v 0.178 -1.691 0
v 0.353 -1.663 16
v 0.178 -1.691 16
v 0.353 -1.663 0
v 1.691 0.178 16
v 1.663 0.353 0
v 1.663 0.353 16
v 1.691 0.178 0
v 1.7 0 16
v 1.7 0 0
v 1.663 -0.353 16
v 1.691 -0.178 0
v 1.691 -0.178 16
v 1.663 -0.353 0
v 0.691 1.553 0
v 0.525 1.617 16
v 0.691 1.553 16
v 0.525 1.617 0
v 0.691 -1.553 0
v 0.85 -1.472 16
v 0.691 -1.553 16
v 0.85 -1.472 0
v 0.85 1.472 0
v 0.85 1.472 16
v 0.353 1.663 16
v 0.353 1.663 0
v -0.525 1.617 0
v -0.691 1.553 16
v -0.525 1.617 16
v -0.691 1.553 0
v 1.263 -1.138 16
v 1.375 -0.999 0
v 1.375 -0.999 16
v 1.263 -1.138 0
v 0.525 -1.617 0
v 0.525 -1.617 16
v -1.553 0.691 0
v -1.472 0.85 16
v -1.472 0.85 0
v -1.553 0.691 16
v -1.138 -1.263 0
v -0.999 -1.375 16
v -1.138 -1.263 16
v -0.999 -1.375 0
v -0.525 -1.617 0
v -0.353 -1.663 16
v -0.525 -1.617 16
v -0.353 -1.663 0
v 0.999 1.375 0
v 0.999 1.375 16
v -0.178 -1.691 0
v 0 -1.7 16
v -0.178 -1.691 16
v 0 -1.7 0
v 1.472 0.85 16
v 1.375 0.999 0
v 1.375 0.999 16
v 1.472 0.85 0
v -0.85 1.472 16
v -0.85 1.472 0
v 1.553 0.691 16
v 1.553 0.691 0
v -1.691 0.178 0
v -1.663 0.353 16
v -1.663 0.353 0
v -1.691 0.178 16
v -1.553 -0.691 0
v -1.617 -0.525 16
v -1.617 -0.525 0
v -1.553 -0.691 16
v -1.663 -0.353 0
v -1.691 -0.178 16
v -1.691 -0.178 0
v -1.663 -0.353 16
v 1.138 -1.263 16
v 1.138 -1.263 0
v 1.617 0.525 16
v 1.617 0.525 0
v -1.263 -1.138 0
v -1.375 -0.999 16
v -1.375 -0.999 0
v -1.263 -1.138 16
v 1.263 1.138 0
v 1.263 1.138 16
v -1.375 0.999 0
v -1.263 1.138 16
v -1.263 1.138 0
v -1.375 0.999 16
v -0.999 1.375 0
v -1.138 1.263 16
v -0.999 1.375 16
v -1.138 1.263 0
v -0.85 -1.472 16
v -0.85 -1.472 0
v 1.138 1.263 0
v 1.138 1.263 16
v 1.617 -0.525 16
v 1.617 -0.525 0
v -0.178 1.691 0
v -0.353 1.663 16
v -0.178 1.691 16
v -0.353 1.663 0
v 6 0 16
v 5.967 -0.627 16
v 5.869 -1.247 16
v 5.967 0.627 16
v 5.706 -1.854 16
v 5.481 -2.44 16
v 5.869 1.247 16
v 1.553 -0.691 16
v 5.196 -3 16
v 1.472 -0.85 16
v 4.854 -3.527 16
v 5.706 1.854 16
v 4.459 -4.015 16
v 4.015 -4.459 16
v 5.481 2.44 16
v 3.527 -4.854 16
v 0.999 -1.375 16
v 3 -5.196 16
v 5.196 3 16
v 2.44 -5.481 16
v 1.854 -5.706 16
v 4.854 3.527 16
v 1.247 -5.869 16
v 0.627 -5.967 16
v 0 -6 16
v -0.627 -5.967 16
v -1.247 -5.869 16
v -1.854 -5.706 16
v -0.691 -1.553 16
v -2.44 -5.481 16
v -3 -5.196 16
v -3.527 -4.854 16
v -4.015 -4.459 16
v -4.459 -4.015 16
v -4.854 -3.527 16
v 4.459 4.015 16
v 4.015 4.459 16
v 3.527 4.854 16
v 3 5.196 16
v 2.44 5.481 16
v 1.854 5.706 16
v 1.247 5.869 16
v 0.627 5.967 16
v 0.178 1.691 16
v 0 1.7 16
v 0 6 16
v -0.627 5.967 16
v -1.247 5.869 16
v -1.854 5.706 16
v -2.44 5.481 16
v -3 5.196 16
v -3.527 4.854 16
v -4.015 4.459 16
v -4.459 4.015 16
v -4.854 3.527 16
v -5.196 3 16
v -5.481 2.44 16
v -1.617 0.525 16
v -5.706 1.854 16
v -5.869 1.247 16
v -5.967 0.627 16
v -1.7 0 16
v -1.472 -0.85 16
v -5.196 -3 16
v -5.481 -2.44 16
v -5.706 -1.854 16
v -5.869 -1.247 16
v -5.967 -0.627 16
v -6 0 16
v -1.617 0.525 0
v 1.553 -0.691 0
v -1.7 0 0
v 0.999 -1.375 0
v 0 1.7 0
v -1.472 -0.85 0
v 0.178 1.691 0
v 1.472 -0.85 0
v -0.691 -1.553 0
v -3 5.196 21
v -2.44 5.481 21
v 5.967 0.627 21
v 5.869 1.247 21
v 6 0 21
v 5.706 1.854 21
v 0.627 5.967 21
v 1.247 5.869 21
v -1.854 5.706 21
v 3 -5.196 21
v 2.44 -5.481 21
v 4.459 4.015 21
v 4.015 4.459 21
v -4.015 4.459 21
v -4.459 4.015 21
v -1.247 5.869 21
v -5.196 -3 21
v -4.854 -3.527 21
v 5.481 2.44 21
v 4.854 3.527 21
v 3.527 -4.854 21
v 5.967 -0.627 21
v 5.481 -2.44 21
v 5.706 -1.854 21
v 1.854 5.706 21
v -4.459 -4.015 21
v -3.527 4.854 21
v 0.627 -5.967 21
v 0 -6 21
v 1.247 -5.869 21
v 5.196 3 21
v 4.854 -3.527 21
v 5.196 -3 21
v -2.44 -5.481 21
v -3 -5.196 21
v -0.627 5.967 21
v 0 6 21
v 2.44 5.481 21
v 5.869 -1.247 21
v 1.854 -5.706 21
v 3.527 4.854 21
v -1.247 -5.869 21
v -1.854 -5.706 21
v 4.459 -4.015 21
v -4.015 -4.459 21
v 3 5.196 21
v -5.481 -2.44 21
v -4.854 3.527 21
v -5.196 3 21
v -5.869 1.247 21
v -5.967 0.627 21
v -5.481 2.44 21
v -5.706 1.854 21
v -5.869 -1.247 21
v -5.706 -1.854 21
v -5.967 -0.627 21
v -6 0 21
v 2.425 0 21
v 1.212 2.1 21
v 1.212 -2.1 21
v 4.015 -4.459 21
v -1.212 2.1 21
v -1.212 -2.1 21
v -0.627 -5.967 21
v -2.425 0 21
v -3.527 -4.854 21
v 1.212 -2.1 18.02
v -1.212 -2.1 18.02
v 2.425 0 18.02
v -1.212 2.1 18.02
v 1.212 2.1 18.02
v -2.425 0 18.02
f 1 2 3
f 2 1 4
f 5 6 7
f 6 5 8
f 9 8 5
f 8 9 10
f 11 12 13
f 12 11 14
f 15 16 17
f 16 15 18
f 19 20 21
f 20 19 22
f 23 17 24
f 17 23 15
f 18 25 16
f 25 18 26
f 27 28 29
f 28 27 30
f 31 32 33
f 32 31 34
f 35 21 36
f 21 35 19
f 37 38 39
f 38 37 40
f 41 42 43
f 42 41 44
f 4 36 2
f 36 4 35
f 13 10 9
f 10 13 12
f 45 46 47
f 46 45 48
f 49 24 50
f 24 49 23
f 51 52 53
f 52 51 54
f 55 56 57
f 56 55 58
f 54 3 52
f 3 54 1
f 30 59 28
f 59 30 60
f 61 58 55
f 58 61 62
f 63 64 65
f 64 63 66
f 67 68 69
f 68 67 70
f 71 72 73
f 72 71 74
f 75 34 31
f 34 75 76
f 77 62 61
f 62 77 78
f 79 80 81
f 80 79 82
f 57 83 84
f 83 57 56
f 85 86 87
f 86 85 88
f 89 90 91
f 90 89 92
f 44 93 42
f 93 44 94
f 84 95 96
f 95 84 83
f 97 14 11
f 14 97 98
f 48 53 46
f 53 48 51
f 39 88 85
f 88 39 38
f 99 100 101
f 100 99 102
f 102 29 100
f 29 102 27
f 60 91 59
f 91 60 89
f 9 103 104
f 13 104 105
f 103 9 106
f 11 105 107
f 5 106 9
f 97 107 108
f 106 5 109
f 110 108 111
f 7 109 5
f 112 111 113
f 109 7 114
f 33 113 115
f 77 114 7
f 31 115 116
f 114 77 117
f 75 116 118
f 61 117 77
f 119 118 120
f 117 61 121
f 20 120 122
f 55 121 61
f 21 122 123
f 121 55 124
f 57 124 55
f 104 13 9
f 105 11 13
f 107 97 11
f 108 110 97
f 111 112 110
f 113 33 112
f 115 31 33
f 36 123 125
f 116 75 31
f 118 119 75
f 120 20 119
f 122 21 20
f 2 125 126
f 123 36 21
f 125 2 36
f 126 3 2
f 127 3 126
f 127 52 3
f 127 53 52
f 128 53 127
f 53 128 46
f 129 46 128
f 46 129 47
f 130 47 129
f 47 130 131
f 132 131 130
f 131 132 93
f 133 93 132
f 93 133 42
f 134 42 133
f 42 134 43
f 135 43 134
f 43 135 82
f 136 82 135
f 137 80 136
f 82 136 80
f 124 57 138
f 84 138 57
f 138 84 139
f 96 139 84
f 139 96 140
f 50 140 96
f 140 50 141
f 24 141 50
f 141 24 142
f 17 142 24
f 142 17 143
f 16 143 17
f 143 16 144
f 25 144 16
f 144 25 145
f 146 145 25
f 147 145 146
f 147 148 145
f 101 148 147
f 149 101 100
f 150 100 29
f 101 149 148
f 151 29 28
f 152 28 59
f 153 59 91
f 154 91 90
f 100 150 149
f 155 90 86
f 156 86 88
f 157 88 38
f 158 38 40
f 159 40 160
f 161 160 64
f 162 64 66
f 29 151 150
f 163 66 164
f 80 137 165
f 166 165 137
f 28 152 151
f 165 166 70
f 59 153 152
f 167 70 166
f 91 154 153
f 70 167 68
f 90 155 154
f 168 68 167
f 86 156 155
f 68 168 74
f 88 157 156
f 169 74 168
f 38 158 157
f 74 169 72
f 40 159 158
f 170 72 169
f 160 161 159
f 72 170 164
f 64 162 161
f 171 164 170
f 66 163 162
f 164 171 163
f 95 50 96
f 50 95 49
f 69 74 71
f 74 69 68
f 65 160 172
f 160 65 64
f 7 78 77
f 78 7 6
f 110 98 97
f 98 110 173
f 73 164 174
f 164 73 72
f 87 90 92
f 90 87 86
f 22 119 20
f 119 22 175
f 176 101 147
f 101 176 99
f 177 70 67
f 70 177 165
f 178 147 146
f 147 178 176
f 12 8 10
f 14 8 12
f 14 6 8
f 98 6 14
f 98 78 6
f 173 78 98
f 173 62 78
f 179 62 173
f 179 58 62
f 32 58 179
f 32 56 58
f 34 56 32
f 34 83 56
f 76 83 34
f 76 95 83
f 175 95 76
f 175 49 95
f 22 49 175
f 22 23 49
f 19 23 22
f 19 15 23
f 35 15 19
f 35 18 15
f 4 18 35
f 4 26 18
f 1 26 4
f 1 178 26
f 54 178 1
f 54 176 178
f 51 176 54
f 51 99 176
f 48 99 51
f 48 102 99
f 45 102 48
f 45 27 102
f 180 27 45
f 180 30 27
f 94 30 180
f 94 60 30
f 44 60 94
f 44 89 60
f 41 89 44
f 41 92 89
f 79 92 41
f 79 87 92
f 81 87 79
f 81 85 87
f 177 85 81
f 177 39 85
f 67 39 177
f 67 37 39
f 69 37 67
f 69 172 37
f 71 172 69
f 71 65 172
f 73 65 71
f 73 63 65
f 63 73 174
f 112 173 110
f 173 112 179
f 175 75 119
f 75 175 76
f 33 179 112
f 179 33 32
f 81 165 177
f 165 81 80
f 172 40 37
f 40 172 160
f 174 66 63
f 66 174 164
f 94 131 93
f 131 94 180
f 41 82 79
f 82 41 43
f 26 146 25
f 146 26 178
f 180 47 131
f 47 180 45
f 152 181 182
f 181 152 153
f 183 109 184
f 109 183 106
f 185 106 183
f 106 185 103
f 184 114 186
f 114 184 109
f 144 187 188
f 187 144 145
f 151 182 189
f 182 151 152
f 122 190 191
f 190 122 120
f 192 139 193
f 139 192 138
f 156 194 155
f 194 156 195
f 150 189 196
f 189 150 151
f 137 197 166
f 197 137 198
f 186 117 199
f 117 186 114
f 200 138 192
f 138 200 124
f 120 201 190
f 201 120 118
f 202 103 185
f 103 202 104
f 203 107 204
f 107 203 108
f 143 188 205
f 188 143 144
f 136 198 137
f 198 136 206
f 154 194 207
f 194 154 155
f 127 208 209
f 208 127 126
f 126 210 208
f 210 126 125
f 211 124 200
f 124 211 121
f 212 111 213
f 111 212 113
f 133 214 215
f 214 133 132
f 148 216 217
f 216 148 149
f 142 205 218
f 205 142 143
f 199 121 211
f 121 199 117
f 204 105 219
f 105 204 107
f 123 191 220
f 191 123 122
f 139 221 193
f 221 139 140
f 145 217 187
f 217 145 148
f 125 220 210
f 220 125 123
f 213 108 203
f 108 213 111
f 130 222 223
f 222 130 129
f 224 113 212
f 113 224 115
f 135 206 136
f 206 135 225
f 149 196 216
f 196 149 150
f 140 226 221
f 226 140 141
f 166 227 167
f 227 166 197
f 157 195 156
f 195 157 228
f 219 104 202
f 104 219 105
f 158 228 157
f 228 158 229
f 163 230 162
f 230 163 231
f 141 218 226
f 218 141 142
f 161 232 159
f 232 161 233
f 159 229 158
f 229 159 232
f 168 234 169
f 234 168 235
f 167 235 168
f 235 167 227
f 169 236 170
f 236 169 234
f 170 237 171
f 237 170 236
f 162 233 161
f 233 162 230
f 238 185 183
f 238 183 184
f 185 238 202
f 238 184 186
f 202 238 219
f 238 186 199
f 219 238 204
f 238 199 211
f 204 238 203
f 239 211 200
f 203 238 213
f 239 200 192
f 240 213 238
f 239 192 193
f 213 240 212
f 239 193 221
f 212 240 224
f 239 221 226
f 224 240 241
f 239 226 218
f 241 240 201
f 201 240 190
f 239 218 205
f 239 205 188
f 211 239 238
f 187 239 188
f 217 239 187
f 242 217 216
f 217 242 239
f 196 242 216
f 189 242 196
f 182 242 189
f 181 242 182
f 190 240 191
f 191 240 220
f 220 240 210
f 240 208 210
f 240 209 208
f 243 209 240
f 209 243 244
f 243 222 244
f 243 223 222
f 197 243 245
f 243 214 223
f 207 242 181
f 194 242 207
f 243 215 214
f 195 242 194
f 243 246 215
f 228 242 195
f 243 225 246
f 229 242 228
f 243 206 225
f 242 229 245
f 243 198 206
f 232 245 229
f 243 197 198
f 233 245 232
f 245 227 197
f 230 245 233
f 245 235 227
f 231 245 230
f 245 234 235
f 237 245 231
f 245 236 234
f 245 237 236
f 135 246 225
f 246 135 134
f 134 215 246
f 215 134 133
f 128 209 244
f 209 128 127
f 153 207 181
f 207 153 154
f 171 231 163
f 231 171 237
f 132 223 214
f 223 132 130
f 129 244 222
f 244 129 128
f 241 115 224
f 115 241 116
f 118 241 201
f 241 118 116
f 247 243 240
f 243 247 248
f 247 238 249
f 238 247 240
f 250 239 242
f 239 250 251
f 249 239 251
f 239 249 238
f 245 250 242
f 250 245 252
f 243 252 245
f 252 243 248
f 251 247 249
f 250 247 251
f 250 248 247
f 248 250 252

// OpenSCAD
// Thumb screw, smooth-shank representation.
$fn = 60;
eps = 0.02;
shaft_d = 3.4;
head_d = 12;
shaft_l = 16;
head_h = 5;
difference() {
    union() { cylinder(d = shaft_d, h = shaft_l); translate([0, 0, shaft_l]) cylinder(d = head_d, h = head_h); }
    translate([0, 0, shaft_l + head_h - 3 + eps]) cylinder(d = head_d * 0.35 / cos(30), h = 3 + eps, $fn = 6);
}
